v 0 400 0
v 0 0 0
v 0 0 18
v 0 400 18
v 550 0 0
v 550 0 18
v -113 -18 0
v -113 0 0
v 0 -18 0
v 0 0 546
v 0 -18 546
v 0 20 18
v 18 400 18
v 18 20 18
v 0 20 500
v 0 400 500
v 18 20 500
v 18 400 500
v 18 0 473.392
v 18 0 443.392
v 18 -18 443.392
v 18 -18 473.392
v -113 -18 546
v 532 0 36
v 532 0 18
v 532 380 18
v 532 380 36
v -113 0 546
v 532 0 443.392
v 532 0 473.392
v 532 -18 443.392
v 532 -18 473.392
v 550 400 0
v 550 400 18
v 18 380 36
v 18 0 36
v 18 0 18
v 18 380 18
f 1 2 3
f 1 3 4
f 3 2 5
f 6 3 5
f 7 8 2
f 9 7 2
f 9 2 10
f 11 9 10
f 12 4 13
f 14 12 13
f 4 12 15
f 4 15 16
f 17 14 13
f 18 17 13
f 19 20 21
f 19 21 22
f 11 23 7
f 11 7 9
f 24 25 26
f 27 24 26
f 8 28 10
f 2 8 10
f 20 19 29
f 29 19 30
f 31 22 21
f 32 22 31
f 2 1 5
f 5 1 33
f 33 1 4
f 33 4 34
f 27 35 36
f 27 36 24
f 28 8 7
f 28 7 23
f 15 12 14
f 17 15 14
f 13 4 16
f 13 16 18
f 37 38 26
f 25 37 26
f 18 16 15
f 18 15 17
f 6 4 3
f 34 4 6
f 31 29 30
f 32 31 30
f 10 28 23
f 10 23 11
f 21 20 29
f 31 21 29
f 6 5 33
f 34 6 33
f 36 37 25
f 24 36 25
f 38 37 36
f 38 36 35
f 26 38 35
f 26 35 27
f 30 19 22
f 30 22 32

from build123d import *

# Parameters (mm, degrees)
F0_W     = 550
F0_H     = 400
F1_DEPTH = 18
F2_W     = 18
F2_H     = 380
F3_DEPTH = 482
F4_W     = 514
F4_H     = 30
F5_DEPTH = 18
F6_W     = 514
F6_H     = 380
F7_DEPTH = 18
F8_W     = 113
F8_H     = 546
F9_DEPTH = 18


with BuildPart() as f1:
    # F0 (on Top) → F1 (new body)
    with BuildSketch(Plane.XY):
        with Locations((275, 200)):
            Rectangle(F0_W, F0_H)
    extrude(amount=F1_DEPTH)


with BuildPart() as f3:
    # F2 (on face) → F3 (new body)
    with BuildSketch(Plane.XY.offset(18)):
        with Locations((9, 210)):
            Rectangle(F2_W, F2_H)
    extrude(amount=F3_DEPTH)


with BuildPart() as f5:
    # F4 (on Front) → F5 (new body)
    with BuildSketch(Plane.XZ):
        with Locations((275, 458.392456)):
            Rectangle(F4_W, F4_H)
    extrude(amount=F5_DEPTH)


with BuildPart() as f7:
    # F6 (on face) → F7 (new body)
    with BuildSketch(Plane.XY.offset(18)):
        with Locations((275, 190)):
            Rectangle(F6_W, F6_H)
    extrude(amount=F7_DEPTH)


with BuildPart() as f9:
    # F8 (on Front) → F9 (new body)
    with BuildSketch(Plane.XZ):
        with Locations((-56.5, 273)):
            Rectangle(F8_W, F8_H)
    extrude(amount=F9_DEPTH)


solid = Compound([f1.part, f3.part, f5.part, f7.part, f9.part])
